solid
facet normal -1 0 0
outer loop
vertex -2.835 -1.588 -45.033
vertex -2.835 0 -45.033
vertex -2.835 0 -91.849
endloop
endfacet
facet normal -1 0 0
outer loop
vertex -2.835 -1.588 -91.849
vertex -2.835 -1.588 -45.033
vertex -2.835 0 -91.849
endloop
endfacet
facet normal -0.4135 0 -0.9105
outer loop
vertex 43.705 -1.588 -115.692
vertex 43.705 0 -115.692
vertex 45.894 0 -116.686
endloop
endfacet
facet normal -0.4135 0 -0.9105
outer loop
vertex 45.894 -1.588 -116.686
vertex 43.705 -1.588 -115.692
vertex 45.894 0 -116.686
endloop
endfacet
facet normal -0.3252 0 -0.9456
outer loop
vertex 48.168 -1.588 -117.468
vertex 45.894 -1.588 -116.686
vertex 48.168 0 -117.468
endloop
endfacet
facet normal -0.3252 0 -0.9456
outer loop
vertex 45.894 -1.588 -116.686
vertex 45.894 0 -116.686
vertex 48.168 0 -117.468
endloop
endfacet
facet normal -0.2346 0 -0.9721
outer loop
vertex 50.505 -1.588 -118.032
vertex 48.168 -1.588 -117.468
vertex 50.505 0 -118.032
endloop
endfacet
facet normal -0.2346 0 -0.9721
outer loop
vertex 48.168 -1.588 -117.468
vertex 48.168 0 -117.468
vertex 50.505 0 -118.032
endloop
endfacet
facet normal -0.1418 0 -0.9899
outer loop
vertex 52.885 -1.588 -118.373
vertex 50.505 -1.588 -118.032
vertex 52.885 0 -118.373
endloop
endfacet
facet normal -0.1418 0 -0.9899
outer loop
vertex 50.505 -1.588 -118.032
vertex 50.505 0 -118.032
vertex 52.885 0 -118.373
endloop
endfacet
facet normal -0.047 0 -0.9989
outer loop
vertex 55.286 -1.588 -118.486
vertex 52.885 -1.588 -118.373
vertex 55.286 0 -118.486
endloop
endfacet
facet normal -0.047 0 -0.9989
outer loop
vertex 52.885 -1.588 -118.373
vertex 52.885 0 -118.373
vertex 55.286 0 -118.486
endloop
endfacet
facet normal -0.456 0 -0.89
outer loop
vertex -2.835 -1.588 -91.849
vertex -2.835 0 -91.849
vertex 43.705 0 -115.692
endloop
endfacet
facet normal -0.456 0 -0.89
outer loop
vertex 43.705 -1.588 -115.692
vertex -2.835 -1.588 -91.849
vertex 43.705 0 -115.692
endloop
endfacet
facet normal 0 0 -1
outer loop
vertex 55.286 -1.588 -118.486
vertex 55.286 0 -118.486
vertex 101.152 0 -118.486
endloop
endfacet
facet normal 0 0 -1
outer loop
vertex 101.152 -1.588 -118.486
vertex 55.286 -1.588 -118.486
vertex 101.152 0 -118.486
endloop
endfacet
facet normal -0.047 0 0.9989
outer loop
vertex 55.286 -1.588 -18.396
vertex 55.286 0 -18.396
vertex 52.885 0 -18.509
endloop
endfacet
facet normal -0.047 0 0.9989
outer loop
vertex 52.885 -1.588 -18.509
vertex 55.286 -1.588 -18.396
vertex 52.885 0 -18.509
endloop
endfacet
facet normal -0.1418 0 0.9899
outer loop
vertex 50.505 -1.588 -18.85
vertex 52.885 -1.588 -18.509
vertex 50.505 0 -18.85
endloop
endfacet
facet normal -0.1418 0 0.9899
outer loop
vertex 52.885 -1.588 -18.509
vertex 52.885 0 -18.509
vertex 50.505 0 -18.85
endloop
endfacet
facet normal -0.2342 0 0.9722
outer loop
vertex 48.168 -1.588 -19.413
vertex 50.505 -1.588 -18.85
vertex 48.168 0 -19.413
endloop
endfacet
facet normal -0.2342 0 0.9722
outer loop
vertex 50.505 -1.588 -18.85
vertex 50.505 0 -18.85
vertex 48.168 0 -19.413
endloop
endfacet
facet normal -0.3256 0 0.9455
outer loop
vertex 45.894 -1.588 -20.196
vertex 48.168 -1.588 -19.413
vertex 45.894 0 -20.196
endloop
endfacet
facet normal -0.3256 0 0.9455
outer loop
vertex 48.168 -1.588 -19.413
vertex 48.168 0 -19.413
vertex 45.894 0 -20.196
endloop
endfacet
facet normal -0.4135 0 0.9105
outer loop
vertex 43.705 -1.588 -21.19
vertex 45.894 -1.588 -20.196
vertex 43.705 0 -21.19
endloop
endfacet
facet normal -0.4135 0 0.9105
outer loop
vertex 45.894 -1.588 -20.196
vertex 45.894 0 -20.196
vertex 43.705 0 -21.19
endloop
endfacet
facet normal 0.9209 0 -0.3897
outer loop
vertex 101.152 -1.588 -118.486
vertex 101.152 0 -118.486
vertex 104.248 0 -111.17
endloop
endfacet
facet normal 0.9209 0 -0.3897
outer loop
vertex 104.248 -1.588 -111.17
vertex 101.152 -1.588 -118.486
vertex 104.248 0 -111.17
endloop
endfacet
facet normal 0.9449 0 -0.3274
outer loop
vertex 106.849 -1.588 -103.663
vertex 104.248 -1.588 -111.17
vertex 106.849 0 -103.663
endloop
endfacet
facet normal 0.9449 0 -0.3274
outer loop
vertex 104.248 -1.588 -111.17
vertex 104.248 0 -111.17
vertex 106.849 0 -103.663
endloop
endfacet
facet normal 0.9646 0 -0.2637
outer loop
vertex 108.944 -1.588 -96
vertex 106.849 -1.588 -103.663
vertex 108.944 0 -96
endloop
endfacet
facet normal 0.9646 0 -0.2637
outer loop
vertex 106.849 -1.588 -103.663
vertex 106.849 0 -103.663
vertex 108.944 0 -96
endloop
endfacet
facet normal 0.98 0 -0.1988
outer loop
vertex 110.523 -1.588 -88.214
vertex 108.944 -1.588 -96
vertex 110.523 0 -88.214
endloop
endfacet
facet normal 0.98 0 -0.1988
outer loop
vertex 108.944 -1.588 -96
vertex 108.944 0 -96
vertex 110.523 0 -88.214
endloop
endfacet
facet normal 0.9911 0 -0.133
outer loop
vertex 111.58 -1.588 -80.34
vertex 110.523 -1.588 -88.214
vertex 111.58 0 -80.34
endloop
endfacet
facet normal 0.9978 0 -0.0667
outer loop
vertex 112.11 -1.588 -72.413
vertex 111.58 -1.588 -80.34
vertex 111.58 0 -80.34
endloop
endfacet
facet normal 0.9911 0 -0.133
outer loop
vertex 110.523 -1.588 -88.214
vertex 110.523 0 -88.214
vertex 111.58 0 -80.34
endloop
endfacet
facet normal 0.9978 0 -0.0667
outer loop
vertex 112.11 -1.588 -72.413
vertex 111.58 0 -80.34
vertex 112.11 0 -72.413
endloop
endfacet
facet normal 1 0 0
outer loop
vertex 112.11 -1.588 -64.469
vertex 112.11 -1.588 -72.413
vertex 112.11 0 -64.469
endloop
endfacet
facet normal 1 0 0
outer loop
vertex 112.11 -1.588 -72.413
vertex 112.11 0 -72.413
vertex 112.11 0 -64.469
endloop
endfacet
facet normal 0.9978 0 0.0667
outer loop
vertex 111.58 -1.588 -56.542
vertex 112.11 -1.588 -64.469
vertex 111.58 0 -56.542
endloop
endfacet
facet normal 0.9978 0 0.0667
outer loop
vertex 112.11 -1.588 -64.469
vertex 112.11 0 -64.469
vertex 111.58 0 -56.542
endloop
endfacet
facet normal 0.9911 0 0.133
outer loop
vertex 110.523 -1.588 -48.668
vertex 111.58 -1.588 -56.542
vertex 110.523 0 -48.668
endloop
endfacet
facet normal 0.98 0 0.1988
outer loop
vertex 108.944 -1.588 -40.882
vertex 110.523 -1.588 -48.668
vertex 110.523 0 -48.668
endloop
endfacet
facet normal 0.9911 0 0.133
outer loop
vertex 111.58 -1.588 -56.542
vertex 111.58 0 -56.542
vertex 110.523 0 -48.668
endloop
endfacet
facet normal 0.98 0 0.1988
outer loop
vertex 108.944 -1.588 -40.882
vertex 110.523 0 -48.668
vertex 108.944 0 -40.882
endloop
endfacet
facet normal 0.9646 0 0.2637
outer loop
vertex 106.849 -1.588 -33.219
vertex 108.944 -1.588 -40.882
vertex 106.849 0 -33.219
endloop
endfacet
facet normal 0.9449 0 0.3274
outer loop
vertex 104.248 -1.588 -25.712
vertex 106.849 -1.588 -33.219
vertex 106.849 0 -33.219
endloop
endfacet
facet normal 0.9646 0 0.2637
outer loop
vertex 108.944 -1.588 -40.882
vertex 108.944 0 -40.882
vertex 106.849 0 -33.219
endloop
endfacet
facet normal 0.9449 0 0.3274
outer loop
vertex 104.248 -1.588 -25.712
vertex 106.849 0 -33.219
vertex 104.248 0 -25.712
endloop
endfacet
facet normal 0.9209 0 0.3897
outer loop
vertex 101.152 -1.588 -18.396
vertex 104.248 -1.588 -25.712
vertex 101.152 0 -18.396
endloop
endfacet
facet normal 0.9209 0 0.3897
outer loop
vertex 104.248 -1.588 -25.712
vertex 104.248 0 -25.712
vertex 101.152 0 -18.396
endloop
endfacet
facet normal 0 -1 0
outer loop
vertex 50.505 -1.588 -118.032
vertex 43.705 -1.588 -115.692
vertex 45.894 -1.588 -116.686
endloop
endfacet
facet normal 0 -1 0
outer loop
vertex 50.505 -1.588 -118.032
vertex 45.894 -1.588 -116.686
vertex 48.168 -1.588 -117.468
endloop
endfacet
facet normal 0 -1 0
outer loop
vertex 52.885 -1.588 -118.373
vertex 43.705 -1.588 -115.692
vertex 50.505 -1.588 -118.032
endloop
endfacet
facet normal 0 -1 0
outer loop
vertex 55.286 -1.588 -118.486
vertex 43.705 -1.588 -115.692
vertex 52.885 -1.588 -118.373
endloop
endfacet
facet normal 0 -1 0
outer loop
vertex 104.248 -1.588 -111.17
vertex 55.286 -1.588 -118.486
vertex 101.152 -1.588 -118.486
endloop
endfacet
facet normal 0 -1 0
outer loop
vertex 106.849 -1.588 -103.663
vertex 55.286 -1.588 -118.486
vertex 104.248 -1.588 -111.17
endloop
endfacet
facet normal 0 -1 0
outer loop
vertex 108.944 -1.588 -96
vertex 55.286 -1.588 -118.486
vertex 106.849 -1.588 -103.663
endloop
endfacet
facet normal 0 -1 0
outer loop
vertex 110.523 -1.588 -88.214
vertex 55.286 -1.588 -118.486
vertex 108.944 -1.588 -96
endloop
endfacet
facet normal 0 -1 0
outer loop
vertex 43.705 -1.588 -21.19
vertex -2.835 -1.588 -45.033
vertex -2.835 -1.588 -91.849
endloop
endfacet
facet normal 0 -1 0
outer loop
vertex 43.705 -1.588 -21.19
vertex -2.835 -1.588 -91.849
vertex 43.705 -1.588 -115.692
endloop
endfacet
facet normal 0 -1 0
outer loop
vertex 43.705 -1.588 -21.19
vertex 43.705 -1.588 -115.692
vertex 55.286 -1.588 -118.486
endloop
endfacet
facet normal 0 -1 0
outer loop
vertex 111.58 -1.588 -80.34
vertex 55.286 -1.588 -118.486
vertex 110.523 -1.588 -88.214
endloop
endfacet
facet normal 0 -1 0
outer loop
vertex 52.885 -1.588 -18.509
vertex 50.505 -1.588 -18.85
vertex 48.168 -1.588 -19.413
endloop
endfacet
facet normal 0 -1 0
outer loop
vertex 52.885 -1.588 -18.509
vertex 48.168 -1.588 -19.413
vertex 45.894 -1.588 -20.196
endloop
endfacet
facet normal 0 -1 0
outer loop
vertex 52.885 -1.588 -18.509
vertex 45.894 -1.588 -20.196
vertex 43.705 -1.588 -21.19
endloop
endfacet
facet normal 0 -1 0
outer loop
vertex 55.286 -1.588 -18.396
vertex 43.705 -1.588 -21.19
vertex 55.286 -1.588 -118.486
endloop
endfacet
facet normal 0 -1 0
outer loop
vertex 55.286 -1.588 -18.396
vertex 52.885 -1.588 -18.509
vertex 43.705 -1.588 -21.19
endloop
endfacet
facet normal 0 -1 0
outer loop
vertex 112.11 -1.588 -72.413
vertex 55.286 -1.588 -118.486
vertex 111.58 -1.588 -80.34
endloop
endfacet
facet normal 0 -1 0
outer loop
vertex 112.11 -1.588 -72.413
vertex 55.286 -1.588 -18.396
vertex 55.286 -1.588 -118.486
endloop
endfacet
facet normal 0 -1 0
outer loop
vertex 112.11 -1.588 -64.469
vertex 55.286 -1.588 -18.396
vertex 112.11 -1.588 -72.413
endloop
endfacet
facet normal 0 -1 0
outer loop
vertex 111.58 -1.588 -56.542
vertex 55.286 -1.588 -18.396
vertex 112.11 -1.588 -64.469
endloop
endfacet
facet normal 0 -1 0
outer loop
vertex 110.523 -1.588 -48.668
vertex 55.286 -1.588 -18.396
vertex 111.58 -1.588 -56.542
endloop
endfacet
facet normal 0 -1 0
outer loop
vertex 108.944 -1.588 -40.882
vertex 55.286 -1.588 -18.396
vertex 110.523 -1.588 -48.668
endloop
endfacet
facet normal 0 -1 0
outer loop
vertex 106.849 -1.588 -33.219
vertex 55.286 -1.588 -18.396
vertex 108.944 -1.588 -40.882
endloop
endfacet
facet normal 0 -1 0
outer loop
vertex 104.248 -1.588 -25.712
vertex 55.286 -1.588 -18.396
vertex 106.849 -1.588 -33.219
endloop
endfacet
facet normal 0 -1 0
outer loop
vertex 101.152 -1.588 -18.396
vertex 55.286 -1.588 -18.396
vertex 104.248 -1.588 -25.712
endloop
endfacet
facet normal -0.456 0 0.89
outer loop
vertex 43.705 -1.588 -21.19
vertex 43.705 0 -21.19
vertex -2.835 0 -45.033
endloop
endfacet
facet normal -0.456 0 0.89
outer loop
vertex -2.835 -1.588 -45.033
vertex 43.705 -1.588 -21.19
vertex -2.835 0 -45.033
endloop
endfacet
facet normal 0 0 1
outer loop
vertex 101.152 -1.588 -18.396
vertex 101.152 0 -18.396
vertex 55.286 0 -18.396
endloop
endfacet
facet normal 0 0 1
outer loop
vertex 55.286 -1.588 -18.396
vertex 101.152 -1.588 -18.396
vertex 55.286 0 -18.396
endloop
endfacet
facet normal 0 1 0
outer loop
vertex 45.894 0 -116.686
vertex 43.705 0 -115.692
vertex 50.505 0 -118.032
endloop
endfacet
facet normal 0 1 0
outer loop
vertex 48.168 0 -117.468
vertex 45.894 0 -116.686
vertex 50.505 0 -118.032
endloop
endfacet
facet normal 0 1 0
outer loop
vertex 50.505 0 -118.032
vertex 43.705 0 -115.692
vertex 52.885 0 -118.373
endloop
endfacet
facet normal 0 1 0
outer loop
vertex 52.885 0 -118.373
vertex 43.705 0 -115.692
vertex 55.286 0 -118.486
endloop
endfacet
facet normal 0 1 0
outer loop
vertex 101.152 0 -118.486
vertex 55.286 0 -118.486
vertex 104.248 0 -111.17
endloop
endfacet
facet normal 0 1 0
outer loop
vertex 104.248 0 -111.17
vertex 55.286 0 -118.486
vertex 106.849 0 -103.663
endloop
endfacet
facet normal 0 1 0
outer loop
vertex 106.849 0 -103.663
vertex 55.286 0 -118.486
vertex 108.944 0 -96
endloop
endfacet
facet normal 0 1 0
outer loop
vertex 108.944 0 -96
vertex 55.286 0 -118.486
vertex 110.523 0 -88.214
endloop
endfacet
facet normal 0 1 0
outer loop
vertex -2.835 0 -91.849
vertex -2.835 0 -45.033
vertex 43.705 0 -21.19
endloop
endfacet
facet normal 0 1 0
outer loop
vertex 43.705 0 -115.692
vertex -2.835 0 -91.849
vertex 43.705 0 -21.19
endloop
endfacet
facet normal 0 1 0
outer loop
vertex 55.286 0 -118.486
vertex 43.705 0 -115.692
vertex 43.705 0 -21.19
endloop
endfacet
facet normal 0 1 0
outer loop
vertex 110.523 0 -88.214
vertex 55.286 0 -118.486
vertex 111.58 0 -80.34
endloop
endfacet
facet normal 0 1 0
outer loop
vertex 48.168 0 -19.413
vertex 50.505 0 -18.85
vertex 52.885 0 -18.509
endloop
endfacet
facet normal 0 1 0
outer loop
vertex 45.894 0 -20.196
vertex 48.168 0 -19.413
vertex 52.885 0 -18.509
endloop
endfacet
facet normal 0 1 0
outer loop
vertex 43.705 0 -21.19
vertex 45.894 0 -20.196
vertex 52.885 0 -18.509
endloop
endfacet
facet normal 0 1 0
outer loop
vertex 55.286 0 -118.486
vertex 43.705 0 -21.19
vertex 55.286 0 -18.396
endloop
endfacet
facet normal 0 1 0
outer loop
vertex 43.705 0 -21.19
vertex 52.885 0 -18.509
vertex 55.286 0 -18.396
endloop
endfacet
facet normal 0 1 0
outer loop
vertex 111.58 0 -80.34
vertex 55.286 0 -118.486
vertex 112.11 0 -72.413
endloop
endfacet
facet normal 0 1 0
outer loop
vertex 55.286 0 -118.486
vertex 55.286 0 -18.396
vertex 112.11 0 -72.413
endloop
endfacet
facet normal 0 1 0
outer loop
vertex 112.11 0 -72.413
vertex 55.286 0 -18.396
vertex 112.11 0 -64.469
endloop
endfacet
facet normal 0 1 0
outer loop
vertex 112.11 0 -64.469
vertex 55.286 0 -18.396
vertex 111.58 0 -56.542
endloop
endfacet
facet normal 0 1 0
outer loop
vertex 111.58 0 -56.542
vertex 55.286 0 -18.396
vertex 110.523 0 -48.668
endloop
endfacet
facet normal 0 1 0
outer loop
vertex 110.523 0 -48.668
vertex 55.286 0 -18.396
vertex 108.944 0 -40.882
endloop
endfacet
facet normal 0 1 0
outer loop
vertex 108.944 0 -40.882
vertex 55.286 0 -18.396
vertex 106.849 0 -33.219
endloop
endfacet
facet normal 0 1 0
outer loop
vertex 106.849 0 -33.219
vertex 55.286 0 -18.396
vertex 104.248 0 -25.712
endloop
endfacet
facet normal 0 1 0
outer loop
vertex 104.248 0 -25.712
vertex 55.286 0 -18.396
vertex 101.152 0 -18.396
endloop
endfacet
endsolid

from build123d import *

# Parameters (mm, degrees)
F1_DEPTH = 1.5875


with BuildPart() as f1:
    # F0 (on Front) → F1 (new body)
    with BuildSketch(Plane.XZ):
        with BuildLine():
            Line((-2.835184, -45.032743), (-2.835184, -91.849111))
            Line((-2.835184, -91.849111), (43.704942, -115.692325))
            ThreePointArc((43.704942, -115.692325), (49.329511, -117.777947), (55.286339, -118.486325))
            Line((55.286339, -118.486325), (101.152416, -118.486325))
            ThreePointArc((101.152416, -118.486325), (112.176016, -68.440927), (101.152416, -18.39553))
            Line((101.152416, -18.39553), (55.286339, -18.39553))
            ThreePointArc((55.286339, -18.39553), (49.329511, -19.103907), (43.704942, -21.18953))
            Line((43.704942, -21.18953), (-2.835184, -45.032743))
        make_face()
    extrude(amount=F1_DEPTH)


solid = f1.part
